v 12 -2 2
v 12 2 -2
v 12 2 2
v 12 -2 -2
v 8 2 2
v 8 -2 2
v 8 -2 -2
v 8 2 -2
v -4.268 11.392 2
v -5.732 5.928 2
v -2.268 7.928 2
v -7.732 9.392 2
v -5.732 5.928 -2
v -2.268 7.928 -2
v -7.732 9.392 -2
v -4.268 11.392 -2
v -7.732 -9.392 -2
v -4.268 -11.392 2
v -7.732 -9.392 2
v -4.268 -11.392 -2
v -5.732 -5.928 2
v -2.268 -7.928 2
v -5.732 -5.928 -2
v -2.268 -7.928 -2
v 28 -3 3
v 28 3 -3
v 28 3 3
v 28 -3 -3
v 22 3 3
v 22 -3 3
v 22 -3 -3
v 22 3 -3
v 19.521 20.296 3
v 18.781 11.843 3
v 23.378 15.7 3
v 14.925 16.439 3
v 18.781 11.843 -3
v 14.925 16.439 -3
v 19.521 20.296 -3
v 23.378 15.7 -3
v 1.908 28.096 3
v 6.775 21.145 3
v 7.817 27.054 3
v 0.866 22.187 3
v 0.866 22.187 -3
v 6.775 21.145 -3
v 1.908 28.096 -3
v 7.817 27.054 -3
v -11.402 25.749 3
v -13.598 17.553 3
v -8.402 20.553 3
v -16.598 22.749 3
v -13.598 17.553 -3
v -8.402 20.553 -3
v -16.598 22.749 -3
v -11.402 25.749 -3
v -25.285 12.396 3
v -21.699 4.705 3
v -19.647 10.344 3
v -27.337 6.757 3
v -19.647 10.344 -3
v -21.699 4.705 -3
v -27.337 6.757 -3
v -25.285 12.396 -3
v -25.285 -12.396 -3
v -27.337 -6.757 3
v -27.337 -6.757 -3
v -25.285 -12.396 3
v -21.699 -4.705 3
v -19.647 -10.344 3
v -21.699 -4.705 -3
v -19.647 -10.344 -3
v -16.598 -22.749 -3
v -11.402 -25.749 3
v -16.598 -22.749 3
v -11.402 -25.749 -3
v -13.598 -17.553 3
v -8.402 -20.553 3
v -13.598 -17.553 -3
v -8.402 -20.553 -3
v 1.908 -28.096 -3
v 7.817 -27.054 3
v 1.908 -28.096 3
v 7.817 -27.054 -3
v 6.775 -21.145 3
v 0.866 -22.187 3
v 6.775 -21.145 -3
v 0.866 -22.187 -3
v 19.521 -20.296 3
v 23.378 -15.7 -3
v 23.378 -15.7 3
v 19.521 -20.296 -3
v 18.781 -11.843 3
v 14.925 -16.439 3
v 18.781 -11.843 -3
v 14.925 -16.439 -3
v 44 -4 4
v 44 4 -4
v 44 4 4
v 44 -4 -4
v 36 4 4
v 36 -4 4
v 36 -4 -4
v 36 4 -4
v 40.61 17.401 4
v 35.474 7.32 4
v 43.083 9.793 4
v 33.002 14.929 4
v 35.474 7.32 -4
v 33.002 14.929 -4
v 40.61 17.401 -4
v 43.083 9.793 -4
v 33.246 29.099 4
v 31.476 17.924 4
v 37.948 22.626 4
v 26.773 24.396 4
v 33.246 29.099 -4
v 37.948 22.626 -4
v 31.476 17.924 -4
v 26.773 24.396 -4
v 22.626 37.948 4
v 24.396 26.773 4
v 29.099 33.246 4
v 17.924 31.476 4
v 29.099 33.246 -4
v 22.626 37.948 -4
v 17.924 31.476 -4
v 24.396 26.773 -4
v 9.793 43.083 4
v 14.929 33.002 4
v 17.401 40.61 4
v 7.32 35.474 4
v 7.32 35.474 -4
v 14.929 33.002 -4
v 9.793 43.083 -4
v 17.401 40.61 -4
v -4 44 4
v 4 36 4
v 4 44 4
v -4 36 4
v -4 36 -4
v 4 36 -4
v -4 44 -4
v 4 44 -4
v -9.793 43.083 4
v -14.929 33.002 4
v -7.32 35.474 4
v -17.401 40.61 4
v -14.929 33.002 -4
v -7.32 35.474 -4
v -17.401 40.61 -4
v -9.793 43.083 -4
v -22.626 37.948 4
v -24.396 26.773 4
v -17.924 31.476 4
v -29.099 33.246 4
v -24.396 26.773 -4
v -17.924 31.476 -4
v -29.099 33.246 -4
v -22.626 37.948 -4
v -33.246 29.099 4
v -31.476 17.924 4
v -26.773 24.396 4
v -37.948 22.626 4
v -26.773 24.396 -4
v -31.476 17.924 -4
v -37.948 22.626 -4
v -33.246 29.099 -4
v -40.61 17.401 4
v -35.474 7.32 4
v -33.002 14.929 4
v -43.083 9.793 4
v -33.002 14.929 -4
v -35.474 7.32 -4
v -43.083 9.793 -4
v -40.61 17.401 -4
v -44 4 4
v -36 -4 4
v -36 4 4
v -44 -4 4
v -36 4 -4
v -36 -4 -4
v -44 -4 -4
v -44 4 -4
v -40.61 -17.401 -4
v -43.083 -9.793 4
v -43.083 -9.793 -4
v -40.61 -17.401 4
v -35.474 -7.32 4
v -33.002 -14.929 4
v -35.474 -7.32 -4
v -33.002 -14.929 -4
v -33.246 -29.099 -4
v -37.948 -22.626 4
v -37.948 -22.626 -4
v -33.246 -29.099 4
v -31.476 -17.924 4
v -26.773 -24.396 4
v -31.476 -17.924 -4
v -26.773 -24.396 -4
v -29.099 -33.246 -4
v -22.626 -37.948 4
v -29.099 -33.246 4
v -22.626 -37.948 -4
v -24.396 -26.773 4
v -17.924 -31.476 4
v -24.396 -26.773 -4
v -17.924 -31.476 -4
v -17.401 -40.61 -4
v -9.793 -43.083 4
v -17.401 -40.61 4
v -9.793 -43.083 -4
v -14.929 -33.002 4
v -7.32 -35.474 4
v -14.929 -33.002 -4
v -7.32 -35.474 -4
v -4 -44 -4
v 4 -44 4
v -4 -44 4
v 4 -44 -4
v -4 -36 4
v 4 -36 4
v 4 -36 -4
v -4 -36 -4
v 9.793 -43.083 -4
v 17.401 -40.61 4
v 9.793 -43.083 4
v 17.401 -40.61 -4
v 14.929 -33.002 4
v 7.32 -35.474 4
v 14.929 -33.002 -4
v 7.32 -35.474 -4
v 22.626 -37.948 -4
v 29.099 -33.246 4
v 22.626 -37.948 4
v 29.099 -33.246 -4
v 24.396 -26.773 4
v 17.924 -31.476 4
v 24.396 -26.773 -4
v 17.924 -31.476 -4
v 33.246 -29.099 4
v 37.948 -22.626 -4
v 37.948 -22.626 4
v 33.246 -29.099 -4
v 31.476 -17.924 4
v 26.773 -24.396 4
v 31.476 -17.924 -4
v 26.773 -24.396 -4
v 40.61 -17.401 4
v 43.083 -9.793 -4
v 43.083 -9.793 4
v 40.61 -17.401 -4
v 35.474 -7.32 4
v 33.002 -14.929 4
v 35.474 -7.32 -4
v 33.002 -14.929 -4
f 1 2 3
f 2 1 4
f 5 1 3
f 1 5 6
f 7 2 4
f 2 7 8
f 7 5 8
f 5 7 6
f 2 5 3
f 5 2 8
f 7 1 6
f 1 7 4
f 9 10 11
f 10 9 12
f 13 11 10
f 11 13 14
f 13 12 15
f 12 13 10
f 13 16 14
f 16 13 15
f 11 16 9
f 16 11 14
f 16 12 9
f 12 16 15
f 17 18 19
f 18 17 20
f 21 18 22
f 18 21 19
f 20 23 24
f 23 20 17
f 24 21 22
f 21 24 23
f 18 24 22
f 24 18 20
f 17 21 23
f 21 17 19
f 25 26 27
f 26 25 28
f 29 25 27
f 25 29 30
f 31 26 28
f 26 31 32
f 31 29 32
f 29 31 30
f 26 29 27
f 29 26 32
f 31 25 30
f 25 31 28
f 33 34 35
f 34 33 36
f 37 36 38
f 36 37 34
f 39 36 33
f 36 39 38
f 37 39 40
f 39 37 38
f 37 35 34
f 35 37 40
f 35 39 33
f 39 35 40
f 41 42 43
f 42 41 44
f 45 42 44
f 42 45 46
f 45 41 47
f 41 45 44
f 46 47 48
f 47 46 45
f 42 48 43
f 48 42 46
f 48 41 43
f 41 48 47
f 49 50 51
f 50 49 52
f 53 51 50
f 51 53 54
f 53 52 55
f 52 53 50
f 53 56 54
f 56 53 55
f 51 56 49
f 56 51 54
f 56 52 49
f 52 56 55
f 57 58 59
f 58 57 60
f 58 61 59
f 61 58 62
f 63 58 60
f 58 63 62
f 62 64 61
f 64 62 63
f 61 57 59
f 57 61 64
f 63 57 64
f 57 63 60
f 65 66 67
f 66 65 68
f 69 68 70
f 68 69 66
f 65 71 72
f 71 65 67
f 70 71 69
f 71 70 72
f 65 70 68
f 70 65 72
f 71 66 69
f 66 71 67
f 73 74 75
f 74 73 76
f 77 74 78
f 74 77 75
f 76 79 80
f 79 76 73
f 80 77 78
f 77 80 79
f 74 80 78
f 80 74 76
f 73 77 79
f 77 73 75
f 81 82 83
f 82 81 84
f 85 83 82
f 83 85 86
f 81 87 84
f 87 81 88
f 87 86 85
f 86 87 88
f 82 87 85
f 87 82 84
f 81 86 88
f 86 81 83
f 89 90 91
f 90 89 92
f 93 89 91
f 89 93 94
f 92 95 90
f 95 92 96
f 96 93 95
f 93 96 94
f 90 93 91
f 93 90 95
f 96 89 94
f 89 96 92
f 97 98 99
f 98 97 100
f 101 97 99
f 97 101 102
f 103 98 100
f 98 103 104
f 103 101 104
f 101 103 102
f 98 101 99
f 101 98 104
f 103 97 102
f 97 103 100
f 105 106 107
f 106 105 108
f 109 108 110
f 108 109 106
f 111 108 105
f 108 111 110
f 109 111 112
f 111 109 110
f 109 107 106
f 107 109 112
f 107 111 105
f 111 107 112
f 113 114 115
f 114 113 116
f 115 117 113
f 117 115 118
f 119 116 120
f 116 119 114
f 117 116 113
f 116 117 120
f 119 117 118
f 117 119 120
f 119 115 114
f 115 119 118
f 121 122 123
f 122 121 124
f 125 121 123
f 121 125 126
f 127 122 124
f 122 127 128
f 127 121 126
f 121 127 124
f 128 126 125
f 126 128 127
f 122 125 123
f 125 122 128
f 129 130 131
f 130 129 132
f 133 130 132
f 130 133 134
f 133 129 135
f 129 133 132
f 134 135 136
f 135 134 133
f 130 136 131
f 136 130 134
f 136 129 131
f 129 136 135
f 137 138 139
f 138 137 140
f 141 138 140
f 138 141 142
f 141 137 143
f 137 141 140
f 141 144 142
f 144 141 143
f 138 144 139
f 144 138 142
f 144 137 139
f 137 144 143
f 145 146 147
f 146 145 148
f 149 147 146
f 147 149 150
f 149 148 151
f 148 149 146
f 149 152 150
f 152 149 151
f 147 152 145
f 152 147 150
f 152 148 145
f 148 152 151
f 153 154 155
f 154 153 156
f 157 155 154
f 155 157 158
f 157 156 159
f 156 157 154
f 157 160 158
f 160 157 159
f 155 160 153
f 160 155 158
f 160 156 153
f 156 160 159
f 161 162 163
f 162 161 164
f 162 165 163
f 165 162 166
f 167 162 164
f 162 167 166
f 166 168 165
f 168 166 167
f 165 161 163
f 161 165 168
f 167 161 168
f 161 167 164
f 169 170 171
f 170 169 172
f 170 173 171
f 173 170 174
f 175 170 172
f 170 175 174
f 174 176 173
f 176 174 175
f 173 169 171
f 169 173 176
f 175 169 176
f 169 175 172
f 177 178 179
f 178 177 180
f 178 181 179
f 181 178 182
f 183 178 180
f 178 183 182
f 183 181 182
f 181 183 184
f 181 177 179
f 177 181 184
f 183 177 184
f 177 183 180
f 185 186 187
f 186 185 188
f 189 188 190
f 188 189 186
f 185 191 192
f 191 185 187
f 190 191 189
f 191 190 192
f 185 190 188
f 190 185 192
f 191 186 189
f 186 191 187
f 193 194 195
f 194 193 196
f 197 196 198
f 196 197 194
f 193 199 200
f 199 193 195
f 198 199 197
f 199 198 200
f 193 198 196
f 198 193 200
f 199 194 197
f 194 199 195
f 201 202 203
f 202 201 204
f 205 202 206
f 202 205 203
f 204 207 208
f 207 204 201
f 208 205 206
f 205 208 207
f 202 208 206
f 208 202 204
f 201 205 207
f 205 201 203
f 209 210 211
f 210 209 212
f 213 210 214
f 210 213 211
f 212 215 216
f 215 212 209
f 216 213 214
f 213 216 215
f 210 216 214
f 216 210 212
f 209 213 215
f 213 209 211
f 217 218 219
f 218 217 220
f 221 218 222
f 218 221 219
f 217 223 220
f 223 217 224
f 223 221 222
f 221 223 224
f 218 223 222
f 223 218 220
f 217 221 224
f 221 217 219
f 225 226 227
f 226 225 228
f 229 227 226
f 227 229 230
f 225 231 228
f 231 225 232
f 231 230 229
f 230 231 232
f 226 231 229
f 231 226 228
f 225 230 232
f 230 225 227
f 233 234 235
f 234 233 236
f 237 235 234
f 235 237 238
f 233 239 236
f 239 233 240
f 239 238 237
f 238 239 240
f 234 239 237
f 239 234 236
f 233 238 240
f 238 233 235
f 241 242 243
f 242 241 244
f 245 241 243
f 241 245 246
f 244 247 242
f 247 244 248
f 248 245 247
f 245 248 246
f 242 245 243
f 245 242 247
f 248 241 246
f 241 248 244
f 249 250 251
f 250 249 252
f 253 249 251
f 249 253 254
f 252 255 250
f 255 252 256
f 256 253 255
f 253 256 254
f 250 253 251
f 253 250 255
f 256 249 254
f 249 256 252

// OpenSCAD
echo(version = version());

function size(x) = assert(x % 2 == 0, "Size must be an even number") x;

module ring(r = 10, cnt = 3, s = 6) {
    assert(r >= 10, "Parameter r must be >= 10");
    assert(cnt >= 3 && cnt <= 20, "Parameter cnt must be between 3 and 20 (inclusive");
    for (a = [0:cnt - 1]) {
        rotate(a * 360 / cnt) translate([r, 0, 0]) cube(size(s), center = true);
    }
}

// ring(5, 5, 4); // trigger assertion for parameter r

// ring(10, 2, 4); // trigger assertion for parameter cnt

// ring(10, 3, 5); // trigger assertion in function size()

color("red") ring(10, 3, 4);
color("green") ring(25, 9, 6);
color("blue") ring(40, 20, 8);

// Written in 2018 by Torsten Paul <Torsten.Paul@gmx.de>
//
// To the extent possible under law, the author(s) have dedicated all
// copyright and related and neighboring rights to this software to the
// public domain worldwide. This software is distributed without any
// warranty.
//
// You should have received a copy of the CC0 Public Domain
// Dedication along with this software.
// If not, see <http://creativecommons.org/publicdomain/zero/1.0/>.
